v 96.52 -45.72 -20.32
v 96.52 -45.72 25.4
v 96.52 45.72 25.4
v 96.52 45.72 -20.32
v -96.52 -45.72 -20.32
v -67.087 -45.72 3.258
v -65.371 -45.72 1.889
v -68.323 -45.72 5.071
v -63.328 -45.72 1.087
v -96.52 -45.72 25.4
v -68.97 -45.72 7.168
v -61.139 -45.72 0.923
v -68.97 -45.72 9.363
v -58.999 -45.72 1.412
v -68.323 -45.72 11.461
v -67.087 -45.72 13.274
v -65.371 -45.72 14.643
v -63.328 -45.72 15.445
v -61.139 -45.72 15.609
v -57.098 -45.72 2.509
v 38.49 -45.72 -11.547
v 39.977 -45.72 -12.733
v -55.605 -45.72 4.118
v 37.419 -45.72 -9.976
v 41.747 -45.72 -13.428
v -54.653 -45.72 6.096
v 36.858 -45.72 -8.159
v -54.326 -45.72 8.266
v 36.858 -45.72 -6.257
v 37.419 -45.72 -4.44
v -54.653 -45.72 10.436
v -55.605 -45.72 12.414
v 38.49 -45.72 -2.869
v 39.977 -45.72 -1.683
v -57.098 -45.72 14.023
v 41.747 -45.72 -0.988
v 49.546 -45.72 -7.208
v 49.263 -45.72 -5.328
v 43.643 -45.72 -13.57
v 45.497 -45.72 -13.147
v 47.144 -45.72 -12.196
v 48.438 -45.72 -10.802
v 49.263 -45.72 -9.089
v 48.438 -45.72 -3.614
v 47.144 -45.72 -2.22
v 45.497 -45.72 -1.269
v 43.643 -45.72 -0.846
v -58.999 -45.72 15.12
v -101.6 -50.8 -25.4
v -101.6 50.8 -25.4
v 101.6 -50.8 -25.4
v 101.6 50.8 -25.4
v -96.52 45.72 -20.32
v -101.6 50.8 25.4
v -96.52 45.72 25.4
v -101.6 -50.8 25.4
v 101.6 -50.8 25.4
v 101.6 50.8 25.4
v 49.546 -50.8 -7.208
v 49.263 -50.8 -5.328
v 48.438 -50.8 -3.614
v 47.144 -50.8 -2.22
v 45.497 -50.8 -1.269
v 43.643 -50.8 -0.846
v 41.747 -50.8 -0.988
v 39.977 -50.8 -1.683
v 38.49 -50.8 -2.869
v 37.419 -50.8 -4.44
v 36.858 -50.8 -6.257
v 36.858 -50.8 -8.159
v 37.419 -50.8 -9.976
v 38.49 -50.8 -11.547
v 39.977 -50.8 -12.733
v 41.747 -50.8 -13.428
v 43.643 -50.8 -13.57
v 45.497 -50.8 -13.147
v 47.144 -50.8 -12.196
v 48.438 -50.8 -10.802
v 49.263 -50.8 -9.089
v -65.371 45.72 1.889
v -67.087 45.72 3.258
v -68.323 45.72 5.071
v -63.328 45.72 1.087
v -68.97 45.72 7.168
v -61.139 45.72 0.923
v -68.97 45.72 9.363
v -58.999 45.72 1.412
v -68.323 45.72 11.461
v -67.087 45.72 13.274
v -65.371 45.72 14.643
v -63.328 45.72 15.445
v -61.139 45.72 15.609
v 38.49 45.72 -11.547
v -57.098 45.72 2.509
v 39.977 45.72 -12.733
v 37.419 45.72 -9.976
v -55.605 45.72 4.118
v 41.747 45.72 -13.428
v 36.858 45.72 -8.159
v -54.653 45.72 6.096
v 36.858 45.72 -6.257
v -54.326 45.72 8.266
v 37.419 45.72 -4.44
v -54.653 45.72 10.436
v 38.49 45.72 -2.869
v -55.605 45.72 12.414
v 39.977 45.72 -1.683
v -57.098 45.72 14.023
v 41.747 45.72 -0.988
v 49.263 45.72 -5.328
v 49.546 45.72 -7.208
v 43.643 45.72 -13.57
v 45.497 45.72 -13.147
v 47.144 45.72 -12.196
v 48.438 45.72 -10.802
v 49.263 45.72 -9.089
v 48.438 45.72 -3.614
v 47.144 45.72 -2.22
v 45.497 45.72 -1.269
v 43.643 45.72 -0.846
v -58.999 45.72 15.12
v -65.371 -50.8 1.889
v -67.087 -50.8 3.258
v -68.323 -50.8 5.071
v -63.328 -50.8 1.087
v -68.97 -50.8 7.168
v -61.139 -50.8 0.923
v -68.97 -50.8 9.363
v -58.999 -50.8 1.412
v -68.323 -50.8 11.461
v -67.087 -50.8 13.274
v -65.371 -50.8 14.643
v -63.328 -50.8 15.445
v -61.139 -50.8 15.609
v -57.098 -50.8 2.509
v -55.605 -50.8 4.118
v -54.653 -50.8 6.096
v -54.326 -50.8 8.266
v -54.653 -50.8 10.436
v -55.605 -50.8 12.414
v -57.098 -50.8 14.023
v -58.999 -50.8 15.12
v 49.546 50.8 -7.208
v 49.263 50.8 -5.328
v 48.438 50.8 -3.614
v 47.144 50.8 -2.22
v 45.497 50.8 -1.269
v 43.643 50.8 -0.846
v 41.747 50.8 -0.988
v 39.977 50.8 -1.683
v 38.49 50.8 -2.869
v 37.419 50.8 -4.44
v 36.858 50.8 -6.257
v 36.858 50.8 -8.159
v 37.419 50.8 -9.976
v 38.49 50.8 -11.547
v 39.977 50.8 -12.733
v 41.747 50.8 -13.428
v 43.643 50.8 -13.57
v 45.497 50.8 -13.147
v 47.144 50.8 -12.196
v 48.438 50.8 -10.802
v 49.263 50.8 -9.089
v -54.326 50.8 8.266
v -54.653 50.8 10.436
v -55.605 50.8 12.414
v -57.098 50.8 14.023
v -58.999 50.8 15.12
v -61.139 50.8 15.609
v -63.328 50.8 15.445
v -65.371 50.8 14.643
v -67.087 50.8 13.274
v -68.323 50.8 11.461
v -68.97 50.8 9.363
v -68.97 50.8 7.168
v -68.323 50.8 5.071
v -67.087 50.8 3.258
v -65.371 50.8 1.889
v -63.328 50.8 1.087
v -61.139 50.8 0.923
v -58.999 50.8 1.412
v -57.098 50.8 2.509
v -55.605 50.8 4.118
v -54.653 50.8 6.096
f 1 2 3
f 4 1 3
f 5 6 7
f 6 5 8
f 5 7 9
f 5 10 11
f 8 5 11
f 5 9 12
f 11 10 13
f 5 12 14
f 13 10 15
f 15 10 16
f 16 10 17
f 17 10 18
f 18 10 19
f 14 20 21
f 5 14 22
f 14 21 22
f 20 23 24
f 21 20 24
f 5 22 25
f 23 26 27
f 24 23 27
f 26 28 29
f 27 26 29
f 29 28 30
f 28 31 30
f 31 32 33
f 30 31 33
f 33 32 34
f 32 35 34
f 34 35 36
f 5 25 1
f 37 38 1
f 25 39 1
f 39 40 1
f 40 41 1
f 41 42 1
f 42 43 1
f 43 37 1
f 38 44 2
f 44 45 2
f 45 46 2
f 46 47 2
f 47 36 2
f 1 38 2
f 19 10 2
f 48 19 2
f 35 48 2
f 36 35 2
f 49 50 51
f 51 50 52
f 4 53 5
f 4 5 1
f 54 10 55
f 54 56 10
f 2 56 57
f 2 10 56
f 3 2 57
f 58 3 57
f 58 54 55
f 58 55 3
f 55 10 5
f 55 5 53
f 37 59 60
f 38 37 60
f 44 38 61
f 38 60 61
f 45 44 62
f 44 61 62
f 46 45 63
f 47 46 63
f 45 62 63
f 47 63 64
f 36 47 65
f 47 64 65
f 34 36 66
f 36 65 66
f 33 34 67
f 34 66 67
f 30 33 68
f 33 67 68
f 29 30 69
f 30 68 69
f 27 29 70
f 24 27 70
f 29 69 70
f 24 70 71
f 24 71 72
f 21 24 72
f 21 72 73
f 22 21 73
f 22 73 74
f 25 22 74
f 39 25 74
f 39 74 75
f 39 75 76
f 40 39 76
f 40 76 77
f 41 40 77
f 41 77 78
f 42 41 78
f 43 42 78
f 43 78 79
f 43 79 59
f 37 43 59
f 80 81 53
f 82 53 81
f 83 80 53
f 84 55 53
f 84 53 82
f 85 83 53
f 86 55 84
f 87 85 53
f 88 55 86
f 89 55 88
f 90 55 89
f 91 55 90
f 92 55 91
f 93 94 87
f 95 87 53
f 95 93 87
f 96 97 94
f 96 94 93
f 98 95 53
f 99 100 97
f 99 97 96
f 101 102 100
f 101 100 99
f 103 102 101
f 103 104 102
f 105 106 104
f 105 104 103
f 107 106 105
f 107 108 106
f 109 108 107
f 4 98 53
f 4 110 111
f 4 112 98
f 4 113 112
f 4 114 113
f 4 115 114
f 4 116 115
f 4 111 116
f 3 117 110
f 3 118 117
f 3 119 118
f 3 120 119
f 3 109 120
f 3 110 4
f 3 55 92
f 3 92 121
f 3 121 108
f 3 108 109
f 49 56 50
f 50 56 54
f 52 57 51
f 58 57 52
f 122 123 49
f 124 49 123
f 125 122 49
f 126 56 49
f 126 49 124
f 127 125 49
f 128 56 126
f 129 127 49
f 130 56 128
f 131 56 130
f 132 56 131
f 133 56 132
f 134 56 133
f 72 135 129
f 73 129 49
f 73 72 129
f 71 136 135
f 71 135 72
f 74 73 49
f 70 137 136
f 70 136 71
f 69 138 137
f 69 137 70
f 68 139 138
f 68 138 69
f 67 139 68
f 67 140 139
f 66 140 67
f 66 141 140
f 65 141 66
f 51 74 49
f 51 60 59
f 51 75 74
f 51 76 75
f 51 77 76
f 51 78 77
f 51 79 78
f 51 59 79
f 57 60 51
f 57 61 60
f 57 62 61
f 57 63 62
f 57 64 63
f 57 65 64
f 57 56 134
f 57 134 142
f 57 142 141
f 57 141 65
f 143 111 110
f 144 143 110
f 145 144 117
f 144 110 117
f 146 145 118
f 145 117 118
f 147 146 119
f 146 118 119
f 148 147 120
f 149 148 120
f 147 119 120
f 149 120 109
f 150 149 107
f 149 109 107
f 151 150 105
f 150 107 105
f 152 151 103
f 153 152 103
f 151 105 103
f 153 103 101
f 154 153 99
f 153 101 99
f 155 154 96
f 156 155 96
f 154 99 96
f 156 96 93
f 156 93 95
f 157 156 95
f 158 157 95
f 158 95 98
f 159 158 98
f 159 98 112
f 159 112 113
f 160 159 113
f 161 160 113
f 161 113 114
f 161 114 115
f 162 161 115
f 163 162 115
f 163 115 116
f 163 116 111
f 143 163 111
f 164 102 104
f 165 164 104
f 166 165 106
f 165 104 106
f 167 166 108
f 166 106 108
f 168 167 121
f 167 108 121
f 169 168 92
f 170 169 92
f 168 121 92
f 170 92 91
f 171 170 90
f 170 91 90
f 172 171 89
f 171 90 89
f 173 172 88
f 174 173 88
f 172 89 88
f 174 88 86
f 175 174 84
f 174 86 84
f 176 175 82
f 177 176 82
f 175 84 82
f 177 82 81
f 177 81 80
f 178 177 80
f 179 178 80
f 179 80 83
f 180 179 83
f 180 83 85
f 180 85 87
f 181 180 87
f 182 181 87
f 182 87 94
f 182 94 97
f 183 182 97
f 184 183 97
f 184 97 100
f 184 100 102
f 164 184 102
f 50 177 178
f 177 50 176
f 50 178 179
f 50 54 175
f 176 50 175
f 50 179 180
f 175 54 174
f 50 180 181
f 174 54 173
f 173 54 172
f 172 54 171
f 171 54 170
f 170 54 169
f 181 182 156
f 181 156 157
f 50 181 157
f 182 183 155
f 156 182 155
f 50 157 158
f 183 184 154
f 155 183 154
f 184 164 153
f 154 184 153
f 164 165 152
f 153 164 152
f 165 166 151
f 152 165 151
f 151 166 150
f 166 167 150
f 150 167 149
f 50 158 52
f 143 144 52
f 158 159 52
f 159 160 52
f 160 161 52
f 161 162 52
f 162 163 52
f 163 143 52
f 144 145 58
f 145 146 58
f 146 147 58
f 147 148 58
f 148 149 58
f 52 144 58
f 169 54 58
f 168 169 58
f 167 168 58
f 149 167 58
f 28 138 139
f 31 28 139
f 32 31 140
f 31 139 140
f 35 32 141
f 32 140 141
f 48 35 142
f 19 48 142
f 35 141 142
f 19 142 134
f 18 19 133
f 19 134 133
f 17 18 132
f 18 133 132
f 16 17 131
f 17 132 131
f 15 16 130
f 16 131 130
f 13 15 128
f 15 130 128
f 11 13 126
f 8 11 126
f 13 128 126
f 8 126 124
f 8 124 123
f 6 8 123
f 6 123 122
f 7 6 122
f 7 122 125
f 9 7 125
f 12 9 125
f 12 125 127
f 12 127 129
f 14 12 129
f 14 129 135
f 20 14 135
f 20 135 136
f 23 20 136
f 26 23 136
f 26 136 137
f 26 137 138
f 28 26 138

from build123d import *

# Parameters (mm, degrees)
F0_W          = 203.2
F0_H          = 101.6
F1_DEPTH      = 25.4
F1_DEPTH_BACK = 25.4
F2_T          = -5.08
F3_R          = 7.363312
F3_R_2        = 6.379647
F4_DEPTH      = 101.601


with BuildPart() as f1:
    # F0 (on Top) → F1 (new body, two sides)
    with BuildSketch(Plane.XY) as f1_sk:
        Rectangle(F0_W, F0_H)
    extrude(amount=F1_DEPTH)
    extrude(f1_sk.sketch, amount=-F1_DEPTH_BACK)

    # F2
    f2_openings = [f1.faces().sort_by_distance(p)[0] for p in [
        (0, 0, 25.4),
    ]]
    offset(amount=F2_T, openings=f2_openings)

    # F3 (on face) → F4 (cut, through all)
    with BuildSketch(Plane.XZ.offset(50.8)):
        with Locations((-61.689176, 8.265927)):
            Circle(F3_R)
        with Locations((43.166649, -7.2081)):
            Circle(F3_R_2)
    extrude(amount=-F4_DEPTH, mode=Mode.SUBTRACT)


solid = f1.part
